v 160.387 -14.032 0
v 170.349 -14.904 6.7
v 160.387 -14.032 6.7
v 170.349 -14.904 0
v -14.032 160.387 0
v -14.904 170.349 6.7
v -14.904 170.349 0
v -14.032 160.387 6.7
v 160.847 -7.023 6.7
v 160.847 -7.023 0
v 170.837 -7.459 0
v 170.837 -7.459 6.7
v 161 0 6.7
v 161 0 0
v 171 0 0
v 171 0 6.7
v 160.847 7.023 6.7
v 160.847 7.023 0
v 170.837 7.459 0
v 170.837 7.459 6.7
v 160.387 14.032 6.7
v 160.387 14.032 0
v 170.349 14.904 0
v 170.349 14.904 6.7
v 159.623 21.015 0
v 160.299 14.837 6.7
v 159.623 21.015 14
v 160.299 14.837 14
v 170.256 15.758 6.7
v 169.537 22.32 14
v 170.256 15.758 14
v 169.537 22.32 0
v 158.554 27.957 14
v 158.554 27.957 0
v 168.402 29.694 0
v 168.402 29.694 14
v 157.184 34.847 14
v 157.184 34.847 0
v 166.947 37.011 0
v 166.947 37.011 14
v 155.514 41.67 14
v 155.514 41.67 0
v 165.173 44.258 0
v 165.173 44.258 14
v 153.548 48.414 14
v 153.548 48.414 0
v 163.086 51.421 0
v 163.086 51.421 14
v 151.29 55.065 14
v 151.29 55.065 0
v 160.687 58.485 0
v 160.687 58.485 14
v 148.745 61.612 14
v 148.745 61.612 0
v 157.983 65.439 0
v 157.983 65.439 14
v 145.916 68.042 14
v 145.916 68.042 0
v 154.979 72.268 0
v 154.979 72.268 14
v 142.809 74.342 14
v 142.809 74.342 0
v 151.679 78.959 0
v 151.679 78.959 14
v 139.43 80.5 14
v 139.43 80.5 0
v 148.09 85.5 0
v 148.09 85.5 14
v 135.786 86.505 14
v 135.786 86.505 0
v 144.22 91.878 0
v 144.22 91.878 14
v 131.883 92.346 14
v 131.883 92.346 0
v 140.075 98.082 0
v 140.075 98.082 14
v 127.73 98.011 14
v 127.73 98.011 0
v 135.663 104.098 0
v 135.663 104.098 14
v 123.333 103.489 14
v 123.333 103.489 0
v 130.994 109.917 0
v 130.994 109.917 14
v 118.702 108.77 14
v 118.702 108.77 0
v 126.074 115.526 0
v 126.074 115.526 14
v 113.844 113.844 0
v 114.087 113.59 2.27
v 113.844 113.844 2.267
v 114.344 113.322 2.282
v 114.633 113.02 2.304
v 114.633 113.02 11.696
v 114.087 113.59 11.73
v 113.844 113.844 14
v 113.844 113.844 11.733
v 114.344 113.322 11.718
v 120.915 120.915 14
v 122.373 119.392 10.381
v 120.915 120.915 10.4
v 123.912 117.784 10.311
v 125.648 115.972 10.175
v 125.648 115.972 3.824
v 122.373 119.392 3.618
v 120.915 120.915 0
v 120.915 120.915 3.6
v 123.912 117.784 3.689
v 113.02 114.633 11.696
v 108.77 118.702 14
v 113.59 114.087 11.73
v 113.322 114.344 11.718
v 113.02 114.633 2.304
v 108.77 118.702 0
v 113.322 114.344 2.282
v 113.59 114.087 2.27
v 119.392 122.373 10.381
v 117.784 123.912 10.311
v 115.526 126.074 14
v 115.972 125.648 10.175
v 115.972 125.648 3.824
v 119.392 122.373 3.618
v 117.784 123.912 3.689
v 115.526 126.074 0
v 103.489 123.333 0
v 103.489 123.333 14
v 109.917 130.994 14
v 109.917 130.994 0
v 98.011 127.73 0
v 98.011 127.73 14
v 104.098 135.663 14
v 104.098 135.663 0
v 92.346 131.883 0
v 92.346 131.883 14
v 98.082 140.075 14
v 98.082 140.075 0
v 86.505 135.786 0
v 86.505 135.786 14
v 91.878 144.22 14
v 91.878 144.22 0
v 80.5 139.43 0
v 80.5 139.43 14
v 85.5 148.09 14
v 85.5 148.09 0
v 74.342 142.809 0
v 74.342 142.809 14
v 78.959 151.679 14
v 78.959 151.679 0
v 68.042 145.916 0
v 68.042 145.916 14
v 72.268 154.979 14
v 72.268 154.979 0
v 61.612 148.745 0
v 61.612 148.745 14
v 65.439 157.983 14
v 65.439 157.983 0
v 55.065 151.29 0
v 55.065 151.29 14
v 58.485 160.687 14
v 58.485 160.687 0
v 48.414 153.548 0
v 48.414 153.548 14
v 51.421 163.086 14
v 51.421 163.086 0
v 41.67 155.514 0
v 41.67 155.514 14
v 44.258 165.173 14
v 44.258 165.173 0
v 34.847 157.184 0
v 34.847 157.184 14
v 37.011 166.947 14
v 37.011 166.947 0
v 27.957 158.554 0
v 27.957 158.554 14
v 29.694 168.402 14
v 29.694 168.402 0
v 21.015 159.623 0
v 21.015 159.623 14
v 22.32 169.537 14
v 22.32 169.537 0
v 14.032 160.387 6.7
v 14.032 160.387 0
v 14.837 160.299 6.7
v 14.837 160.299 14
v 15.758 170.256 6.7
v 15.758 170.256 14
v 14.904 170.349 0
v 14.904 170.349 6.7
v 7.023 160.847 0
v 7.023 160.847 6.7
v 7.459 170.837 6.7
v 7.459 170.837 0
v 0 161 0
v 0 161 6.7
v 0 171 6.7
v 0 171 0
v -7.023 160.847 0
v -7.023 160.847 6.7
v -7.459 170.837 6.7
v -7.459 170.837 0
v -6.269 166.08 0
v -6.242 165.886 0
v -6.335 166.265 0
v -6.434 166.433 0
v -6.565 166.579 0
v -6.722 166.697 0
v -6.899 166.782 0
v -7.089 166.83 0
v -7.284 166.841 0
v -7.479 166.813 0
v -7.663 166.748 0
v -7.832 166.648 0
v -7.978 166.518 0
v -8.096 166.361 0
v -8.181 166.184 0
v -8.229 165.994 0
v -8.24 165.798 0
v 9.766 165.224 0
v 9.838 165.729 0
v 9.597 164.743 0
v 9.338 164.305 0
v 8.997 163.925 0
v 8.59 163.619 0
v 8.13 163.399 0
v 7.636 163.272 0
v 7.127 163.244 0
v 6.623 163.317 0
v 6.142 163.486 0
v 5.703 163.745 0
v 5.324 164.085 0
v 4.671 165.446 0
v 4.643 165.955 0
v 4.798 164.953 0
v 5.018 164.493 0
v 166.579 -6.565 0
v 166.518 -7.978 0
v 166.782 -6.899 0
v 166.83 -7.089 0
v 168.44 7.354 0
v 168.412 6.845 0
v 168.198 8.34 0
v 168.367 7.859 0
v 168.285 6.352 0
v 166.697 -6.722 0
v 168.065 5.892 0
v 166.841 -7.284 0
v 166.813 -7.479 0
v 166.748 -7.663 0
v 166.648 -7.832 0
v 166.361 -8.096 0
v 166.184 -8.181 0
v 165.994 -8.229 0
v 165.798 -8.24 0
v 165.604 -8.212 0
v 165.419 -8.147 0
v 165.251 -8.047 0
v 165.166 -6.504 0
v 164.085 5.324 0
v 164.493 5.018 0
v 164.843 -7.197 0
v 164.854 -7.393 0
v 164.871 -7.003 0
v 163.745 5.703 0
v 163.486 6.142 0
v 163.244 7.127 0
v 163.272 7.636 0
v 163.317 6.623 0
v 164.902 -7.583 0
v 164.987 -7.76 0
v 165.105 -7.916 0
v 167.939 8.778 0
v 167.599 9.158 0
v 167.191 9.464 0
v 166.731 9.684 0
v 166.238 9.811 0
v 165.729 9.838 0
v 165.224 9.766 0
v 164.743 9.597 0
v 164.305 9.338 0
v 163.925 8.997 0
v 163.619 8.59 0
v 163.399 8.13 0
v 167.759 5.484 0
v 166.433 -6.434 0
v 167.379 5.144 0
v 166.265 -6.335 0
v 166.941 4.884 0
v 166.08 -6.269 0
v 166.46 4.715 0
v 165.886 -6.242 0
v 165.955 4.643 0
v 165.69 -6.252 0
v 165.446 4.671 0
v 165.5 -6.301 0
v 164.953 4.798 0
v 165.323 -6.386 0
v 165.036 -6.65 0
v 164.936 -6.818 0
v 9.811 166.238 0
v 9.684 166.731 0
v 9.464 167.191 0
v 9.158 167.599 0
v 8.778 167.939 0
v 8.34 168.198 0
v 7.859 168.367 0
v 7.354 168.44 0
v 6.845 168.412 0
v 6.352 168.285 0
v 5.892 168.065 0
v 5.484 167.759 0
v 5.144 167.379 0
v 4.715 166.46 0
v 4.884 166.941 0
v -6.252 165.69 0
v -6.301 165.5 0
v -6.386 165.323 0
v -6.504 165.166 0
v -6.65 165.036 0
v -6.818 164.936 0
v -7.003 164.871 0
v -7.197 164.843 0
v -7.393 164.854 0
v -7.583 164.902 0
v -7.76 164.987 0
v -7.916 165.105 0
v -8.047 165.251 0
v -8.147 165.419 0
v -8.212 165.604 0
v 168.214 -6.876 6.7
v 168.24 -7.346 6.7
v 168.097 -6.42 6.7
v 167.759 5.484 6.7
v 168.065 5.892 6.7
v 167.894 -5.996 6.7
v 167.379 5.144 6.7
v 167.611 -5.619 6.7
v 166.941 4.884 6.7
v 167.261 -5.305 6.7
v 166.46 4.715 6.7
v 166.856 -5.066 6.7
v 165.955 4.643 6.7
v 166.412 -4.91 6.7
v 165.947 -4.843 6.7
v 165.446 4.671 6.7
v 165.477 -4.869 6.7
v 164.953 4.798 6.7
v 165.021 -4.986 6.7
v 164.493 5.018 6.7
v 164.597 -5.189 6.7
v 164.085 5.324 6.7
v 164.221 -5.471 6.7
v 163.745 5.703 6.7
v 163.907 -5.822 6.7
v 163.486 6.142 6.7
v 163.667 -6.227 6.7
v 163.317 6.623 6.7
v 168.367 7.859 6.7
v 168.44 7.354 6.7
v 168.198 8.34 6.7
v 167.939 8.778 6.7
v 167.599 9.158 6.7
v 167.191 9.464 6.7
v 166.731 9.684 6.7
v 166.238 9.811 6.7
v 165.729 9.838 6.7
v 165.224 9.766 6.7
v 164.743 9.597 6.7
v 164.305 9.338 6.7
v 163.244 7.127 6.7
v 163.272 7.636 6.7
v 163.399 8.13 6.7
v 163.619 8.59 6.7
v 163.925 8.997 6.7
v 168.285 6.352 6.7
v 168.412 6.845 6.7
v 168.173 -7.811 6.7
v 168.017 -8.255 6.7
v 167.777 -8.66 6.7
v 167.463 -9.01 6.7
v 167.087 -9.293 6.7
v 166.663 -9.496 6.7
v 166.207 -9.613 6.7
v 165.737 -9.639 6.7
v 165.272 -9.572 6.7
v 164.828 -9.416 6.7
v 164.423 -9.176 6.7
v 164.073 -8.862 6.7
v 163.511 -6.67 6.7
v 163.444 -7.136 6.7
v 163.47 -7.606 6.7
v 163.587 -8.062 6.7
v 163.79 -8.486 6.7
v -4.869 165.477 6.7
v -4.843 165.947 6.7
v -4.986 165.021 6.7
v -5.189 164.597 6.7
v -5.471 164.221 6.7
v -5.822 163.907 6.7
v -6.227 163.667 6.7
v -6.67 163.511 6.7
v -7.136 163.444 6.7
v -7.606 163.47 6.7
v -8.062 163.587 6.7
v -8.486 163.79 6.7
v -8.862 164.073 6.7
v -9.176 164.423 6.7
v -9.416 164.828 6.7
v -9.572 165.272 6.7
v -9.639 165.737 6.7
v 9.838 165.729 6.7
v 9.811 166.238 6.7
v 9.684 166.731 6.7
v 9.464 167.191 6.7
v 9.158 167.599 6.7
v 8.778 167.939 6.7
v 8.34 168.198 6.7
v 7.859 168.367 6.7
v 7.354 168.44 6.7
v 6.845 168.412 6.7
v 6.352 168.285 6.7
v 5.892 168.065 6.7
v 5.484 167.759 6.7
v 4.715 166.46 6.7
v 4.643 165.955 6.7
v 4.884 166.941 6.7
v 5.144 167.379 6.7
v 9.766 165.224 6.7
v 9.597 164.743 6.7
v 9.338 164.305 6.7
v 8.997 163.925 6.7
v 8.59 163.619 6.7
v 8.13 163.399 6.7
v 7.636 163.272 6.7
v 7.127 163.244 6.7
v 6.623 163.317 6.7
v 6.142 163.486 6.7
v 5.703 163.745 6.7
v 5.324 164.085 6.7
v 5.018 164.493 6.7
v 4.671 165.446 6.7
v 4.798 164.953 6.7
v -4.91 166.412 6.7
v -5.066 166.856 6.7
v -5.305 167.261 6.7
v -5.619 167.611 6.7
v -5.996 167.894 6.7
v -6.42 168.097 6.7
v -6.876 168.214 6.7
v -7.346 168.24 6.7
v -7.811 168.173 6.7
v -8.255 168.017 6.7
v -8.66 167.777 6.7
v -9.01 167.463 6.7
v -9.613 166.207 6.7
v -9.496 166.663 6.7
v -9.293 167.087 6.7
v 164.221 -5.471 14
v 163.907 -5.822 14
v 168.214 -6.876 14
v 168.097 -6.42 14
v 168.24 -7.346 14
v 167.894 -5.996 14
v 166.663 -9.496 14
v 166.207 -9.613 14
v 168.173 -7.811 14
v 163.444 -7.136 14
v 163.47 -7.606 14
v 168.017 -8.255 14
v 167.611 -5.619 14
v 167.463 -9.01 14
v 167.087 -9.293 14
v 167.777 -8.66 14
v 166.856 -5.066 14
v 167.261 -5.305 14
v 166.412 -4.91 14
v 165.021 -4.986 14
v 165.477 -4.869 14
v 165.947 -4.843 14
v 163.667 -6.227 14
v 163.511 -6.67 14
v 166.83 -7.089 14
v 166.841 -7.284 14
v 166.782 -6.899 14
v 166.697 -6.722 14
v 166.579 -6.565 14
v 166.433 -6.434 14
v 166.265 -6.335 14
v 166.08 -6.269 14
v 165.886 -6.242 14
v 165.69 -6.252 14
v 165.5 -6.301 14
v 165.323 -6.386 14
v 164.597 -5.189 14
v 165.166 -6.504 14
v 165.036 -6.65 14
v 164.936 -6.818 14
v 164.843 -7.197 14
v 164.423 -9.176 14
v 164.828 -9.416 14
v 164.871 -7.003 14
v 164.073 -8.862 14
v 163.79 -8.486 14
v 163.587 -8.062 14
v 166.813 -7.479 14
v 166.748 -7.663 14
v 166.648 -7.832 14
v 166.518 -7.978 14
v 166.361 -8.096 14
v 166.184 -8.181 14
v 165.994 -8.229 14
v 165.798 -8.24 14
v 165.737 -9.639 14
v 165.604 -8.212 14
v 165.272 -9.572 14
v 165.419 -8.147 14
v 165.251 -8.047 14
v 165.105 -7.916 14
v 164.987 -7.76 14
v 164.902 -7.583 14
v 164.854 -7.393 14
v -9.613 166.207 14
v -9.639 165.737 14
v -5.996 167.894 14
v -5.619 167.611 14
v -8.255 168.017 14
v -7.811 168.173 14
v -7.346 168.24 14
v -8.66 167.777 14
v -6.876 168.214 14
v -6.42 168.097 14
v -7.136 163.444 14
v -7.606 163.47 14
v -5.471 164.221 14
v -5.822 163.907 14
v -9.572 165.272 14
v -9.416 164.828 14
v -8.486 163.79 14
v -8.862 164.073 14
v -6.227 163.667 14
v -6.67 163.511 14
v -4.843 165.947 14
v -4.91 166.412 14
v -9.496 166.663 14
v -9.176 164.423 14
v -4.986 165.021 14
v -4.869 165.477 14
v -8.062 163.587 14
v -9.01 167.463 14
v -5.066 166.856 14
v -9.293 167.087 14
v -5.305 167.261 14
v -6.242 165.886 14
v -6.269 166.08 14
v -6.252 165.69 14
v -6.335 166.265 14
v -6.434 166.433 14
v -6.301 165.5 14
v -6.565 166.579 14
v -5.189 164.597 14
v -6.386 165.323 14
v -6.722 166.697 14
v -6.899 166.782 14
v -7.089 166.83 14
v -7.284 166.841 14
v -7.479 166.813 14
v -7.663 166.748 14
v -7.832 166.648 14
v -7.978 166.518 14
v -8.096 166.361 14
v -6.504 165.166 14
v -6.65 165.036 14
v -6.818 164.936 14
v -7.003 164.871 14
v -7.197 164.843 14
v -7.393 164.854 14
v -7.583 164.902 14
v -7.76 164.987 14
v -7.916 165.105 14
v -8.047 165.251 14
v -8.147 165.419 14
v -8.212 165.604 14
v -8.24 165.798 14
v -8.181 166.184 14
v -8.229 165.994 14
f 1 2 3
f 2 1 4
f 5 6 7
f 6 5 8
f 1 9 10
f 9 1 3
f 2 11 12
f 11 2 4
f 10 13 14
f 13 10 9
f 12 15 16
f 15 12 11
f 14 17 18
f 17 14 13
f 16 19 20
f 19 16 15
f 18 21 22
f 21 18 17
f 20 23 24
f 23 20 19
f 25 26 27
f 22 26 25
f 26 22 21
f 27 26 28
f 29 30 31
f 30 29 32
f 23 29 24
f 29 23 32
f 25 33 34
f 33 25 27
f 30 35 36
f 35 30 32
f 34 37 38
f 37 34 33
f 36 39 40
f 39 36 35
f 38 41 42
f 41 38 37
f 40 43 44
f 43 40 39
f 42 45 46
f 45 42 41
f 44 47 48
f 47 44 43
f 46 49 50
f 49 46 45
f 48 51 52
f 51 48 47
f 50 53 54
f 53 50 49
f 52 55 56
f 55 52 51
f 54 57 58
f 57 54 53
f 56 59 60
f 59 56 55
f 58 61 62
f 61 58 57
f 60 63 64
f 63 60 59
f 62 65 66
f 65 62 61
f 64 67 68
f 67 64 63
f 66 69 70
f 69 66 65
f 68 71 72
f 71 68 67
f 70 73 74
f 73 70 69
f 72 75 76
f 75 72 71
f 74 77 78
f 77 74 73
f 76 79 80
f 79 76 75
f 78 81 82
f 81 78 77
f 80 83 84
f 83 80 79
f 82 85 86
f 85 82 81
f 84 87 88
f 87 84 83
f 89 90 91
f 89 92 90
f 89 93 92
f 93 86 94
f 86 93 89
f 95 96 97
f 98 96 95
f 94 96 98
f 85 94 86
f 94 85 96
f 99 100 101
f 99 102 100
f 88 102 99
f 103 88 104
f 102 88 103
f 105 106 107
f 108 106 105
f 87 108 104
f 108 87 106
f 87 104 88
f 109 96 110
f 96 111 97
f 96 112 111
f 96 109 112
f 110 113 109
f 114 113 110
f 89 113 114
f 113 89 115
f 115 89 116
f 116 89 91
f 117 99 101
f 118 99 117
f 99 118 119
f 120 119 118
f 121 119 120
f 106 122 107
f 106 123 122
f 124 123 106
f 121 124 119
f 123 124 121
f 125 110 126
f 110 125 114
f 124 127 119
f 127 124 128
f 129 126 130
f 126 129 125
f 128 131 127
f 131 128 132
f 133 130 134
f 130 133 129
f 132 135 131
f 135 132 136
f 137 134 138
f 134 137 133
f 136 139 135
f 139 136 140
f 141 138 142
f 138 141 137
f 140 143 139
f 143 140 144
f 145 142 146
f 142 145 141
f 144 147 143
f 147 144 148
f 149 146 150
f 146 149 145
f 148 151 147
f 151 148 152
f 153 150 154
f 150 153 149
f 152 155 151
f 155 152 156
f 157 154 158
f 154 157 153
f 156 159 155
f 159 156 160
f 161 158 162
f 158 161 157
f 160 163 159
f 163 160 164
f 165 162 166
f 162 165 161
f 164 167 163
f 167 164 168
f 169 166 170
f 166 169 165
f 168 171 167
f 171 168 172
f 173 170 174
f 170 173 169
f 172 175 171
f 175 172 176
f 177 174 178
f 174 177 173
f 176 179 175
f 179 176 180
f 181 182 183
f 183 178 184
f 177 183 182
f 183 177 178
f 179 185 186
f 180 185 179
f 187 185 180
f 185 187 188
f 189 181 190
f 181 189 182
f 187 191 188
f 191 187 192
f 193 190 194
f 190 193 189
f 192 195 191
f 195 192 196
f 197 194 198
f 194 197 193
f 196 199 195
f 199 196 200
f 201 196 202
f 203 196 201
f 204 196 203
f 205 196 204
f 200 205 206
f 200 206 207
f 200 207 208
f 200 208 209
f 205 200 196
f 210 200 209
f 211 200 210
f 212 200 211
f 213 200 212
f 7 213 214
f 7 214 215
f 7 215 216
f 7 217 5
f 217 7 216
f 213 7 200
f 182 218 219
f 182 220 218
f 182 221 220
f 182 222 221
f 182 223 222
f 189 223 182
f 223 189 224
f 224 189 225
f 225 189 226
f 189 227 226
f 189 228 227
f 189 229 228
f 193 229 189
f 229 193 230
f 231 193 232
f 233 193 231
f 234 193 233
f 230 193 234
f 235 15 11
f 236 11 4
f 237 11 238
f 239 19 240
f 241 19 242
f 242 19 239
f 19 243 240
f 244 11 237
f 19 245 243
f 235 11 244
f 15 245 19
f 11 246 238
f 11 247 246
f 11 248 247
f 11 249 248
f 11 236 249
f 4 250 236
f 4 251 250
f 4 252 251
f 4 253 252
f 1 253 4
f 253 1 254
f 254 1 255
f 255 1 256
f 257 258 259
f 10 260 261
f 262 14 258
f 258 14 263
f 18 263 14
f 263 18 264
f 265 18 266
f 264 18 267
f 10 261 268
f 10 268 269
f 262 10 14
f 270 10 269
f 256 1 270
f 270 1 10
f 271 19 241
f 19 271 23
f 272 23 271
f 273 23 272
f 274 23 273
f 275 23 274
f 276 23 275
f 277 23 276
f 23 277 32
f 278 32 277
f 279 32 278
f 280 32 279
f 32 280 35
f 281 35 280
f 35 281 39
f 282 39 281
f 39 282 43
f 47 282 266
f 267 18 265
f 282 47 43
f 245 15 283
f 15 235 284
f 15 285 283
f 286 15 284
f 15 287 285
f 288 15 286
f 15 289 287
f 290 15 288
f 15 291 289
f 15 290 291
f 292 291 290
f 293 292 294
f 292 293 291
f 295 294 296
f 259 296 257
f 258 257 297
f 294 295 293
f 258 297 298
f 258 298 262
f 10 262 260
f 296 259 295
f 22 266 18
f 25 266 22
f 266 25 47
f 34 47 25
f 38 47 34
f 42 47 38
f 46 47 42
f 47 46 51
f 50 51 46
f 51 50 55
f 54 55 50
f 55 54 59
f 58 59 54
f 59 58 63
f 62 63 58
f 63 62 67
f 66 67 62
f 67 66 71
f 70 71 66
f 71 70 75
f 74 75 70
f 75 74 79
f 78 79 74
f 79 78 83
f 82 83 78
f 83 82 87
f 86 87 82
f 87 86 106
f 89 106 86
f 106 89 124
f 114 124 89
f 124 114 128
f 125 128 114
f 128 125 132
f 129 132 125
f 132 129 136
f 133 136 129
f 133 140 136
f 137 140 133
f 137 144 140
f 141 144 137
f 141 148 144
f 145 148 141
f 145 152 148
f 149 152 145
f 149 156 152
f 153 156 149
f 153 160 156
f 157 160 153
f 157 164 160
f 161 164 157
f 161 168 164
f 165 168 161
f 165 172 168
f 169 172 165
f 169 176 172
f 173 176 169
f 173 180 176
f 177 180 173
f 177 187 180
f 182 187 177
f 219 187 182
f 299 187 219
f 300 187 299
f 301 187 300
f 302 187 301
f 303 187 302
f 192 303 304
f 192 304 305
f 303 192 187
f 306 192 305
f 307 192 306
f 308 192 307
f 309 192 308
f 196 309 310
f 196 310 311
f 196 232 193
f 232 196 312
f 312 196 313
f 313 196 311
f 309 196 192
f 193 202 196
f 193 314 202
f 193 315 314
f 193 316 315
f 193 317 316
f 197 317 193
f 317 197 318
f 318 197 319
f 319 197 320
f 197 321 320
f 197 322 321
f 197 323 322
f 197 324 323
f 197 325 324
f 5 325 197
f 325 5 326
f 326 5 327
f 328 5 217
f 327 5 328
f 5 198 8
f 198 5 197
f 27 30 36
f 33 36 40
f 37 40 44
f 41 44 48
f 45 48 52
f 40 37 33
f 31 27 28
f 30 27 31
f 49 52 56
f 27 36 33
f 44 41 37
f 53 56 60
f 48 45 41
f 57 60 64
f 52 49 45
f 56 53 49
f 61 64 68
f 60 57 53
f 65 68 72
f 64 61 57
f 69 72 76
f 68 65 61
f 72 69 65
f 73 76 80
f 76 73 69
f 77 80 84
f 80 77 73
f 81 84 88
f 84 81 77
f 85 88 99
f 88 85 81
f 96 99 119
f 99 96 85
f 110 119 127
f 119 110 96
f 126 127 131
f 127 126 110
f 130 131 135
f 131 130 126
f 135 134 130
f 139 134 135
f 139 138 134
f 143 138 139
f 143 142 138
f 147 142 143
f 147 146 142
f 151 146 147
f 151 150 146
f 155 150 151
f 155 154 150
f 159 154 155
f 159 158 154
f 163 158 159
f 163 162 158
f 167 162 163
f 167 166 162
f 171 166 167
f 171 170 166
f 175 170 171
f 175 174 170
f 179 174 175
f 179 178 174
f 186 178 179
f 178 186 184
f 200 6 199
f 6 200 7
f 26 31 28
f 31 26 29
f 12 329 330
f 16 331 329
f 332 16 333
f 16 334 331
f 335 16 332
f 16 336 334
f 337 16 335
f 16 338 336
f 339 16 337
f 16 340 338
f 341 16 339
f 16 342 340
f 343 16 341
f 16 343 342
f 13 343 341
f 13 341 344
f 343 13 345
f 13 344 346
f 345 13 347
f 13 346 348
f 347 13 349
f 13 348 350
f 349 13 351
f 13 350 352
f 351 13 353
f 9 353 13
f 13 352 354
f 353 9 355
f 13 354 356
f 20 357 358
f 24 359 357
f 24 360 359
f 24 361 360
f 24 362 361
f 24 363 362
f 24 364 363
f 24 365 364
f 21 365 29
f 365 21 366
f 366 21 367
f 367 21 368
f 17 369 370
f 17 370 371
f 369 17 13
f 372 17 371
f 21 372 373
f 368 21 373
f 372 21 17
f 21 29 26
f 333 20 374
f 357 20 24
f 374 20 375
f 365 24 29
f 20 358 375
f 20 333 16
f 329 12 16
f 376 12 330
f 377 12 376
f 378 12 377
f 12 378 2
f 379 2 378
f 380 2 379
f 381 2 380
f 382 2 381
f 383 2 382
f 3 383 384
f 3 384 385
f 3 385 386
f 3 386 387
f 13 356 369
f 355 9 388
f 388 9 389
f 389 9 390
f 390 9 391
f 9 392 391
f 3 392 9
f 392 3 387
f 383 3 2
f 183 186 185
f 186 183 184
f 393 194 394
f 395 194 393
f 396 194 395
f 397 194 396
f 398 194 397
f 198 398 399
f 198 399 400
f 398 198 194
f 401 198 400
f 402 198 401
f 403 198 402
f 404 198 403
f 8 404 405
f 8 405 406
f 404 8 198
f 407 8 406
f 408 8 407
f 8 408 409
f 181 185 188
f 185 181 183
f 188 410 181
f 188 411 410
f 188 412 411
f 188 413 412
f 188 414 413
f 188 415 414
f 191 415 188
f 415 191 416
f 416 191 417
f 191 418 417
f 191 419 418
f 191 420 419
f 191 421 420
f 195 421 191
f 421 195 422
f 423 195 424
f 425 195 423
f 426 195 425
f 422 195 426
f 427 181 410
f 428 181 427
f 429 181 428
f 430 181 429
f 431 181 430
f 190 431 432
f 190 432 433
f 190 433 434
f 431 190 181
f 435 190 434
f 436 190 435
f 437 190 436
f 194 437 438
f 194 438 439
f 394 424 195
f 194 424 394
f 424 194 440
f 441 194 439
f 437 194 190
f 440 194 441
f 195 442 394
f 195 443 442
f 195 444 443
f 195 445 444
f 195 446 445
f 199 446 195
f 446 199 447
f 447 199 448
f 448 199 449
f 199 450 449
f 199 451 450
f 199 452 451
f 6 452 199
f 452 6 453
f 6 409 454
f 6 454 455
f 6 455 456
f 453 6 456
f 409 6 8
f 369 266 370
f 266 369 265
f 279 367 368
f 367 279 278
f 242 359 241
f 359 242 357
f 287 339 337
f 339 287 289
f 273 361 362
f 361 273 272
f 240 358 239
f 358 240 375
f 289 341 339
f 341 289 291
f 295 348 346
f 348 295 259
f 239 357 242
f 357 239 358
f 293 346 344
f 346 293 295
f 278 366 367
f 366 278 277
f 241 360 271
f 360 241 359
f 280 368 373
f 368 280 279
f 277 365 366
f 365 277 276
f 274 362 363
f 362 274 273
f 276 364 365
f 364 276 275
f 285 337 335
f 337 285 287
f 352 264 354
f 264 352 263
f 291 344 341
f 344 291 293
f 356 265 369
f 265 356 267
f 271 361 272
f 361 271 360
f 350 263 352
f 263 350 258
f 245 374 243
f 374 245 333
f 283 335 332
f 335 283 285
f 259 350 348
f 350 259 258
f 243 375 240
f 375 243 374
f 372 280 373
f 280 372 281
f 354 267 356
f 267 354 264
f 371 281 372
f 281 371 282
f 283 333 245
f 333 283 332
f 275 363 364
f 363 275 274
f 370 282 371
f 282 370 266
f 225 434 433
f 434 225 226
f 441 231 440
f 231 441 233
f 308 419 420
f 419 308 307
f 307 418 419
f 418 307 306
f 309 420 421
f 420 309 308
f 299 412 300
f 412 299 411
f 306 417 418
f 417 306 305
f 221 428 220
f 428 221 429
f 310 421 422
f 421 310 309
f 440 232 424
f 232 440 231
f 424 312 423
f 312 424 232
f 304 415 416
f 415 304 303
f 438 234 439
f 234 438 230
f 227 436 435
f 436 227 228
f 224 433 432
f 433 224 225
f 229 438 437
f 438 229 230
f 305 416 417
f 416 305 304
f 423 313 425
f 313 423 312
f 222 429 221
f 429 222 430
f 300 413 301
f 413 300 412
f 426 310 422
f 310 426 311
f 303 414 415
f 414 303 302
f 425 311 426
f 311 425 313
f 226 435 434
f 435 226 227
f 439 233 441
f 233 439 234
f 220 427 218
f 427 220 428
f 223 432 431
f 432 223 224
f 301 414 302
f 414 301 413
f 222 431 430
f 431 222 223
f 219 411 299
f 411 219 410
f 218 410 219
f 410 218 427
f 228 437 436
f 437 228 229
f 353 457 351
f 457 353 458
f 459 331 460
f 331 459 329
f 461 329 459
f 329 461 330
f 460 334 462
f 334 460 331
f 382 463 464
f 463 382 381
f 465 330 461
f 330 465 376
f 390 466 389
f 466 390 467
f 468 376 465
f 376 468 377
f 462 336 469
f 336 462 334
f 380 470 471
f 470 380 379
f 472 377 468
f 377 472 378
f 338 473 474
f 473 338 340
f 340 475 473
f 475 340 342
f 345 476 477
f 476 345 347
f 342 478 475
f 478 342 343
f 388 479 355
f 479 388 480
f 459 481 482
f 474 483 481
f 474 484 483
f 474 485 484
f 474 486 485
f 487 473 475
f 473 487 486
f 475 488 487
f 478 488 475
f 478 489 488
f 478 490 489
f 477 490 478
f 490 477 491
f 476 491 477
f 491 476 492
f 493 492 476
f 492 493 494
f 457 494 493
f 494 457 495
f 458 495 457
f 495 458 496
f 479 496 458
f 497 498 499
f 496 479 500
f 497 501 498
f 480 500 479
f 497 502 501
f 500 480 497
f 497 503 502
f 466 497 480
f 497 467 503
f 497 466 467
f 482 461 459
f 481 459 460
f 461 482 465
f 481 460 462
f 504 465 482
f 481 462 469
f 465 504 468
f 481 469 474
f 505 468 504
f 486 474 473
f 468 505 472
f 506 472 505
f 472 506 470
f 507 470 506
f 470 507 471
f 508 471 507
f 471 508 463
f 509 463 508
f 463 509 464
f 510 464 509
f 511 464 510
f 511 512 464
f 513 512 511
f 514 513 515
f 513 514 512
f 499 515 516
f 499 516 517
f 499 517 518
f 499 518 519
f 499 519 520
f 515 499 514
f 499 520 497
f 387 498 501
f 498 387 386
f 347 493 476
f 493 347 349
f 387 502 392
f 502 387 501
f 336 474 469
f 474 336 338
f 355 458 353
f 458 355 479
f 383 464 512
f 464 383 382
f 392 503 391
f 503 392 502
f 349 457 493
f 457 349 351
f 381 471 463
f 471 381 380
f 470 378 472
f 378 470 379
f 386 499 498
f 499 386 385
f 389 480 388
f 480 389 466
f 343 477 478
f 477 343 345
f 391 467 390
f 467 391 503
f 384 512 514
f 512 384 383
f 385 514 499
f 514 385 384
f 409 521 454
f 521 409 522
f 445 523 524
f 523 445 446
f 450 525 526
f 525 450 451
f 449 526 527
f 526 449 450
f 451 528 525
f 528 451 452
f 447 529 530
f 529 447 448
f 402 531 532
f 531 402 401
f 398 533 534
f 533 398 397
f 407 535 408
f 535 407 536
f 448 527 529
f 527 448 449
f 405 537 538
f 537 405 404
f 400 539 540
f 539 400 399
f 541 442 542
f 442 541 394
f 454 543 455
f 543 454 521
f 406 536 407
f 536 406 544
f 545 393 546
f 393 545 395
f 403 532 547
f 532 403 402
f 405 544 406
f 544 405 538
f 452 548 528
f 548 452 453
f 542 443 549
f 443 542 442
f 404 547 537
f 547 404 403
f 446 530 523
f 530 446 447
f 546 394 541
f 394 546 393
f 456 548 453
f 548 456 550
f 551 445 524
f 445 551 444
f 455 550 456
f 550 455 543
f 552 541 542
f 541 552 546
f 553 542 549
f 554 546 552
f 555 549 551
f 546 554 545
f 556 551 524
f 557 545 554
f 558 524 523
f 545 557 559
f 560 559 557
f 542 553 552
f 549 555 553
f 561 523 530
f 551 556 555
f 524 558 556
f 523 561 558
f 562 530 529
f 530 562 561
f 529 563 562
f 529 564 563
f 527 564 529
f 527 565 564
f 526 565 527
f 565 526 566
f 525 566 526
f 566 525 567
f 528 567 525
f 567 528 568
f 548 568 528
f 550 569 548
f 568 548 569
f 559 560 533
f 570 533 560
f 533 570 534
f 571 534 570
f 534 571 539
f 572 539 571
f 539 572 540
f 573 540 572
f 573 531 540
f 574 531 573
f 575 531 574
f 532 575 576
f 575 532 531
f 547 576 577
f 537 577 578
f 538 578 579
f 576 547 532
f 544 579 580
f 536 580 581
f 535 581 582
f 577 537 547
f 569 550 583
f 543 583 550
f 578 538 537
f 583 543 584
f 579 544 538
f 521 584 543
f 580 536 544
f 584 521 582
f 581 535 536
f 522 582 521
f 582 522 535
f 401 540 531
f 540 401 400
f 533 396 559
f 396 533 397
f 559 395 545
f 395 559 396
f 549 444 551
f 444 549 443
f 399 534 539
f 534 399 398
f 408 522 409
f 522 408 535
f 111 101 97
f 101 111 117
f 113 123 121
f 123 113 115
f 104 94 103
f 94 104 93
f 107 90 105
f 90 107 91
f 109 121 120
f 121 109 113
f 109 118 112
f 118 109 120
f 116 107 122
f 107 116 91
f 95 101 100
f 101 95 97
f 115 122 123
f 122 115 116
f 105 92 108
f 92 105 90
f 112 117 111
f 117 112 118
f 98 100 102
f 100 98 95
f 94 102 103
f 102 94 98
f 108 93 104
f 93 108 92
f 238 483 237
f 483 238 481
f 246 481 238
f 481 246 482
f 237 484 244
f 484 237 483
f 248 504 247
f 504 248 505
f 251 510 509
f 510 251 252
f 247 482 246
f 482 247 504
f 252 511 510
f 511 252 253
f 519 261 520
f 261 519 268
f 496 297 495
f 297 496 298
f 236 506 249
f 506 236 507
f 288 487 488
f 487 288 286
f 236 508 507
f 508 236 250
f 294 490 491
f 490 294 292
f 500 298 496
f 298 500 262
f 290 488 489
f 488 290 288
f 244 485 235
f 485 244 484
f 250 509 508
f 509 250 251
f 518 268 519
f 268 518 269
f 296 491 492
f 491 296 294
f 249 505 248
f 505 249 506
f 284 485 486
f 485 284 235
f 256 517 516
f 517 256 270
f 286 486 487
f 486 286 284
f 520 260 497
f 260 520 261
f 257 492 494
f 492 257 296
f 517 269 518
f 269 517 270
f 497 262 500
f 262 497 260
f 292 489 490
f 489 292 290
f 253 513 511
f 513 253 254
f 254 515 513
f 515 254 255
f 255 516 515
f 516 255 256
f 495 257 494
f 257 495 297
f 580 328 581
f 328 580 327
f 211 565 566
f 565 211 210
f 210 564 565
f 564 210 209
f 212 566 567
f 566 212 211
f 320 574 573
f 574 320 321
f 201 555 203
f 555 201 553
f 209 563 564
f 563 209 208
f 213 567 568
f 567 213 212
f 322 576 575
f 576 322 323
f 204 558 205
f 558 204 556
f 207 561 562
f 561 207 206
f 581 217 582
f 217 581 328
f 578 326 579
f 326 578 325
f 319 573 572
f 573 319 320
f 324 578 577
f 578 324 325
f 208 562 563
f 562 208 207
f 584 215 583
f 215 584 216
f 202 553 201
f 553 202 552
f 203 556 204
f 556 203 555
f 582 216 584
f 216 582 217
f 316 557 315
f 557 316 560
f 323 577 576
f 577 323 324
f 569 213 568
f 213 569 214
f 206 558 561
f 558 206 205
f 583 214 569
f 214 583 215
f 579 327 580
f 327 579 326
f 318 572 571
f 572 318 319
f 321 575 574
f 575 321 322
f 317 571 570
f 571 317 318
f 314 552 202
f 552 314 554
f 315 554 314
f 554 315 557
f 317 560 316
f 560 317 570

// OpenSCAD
hole=true;
radius=16.1;
thick=1.4;
width=1;

scale([10,10,10]) {
//a=0.02;
    a=0.01;
    {
    echo(a);
b=0; {
//translate([b*4,a*1000,0])
    difference(){
union(){ 
difference() {
rotate([0,0,-5]) rotate_extrude($fn=144,angle=100) translate([radius,0,0])polygon( points=[[0,0],[width,0],[width,thick],[0,thick]] );
rotate([0,0,-25+0.08*3.6]) rotate_extrude($fn=144,angle=30)  translate([radius-1,thick/2-0.03,0])polygon( points=[[0,0],[3,0],[3,1],[0,1]] ); 
rotate([0,0,85-0.08*3.6]) rotate_extrude($fn=144,angle=30)  translate([radius-1,thick/2-0.03,0])polygon( points=[[0,0],[3,0],[3,1],[0,1]] ); 
rotate ([0,0,2.5]) translate([radius+width/2,0,0])cylinder($fn=32,h=5,center=true,r=0.25+a) ; 
rotate ([0,0,87.5]) translate([radius+width/2,0,0])cylinder($fn=32,h=5,center=true,r=0.25+a) ; 

}
rotate ([0,0,-2.5]) translate([radius+width/2,0,thick/4])cylinder($fn=32,h=thick*3/4,r=0.25-a) ; 
rotate ([0,0,92.5]) translate([radius+width/2,0,thick/4])cylinder($fn=32,h=thick*3/4,r=0.25-a) ;
}
if (hole) {
rotate([0,0,45]) translate([radius-0.2,0,0]) rotate([0,0,-30]) rotate_extrude($fn=36,angle=60) polygon( points=[[0,0.2],[0,thick-0.2],[1.5,thick-0.4],[1.5,0.4]] );
}
 
rotate ([0,0,-2.5]) translate([radius+width/2,0,-thick/4])cylinder($fn=32,h=thick*2,r=0.1) ; 
rotate ([0,0,92.5]) translate([radius+width/2,0,-thick/4])cylinder($fn=32,h=thick*2,r=0.1) ;
//translate([1.3+b*0.8,-2,-3]) cube([20,20,20]);
}
}
}
}
echo(version=version());
